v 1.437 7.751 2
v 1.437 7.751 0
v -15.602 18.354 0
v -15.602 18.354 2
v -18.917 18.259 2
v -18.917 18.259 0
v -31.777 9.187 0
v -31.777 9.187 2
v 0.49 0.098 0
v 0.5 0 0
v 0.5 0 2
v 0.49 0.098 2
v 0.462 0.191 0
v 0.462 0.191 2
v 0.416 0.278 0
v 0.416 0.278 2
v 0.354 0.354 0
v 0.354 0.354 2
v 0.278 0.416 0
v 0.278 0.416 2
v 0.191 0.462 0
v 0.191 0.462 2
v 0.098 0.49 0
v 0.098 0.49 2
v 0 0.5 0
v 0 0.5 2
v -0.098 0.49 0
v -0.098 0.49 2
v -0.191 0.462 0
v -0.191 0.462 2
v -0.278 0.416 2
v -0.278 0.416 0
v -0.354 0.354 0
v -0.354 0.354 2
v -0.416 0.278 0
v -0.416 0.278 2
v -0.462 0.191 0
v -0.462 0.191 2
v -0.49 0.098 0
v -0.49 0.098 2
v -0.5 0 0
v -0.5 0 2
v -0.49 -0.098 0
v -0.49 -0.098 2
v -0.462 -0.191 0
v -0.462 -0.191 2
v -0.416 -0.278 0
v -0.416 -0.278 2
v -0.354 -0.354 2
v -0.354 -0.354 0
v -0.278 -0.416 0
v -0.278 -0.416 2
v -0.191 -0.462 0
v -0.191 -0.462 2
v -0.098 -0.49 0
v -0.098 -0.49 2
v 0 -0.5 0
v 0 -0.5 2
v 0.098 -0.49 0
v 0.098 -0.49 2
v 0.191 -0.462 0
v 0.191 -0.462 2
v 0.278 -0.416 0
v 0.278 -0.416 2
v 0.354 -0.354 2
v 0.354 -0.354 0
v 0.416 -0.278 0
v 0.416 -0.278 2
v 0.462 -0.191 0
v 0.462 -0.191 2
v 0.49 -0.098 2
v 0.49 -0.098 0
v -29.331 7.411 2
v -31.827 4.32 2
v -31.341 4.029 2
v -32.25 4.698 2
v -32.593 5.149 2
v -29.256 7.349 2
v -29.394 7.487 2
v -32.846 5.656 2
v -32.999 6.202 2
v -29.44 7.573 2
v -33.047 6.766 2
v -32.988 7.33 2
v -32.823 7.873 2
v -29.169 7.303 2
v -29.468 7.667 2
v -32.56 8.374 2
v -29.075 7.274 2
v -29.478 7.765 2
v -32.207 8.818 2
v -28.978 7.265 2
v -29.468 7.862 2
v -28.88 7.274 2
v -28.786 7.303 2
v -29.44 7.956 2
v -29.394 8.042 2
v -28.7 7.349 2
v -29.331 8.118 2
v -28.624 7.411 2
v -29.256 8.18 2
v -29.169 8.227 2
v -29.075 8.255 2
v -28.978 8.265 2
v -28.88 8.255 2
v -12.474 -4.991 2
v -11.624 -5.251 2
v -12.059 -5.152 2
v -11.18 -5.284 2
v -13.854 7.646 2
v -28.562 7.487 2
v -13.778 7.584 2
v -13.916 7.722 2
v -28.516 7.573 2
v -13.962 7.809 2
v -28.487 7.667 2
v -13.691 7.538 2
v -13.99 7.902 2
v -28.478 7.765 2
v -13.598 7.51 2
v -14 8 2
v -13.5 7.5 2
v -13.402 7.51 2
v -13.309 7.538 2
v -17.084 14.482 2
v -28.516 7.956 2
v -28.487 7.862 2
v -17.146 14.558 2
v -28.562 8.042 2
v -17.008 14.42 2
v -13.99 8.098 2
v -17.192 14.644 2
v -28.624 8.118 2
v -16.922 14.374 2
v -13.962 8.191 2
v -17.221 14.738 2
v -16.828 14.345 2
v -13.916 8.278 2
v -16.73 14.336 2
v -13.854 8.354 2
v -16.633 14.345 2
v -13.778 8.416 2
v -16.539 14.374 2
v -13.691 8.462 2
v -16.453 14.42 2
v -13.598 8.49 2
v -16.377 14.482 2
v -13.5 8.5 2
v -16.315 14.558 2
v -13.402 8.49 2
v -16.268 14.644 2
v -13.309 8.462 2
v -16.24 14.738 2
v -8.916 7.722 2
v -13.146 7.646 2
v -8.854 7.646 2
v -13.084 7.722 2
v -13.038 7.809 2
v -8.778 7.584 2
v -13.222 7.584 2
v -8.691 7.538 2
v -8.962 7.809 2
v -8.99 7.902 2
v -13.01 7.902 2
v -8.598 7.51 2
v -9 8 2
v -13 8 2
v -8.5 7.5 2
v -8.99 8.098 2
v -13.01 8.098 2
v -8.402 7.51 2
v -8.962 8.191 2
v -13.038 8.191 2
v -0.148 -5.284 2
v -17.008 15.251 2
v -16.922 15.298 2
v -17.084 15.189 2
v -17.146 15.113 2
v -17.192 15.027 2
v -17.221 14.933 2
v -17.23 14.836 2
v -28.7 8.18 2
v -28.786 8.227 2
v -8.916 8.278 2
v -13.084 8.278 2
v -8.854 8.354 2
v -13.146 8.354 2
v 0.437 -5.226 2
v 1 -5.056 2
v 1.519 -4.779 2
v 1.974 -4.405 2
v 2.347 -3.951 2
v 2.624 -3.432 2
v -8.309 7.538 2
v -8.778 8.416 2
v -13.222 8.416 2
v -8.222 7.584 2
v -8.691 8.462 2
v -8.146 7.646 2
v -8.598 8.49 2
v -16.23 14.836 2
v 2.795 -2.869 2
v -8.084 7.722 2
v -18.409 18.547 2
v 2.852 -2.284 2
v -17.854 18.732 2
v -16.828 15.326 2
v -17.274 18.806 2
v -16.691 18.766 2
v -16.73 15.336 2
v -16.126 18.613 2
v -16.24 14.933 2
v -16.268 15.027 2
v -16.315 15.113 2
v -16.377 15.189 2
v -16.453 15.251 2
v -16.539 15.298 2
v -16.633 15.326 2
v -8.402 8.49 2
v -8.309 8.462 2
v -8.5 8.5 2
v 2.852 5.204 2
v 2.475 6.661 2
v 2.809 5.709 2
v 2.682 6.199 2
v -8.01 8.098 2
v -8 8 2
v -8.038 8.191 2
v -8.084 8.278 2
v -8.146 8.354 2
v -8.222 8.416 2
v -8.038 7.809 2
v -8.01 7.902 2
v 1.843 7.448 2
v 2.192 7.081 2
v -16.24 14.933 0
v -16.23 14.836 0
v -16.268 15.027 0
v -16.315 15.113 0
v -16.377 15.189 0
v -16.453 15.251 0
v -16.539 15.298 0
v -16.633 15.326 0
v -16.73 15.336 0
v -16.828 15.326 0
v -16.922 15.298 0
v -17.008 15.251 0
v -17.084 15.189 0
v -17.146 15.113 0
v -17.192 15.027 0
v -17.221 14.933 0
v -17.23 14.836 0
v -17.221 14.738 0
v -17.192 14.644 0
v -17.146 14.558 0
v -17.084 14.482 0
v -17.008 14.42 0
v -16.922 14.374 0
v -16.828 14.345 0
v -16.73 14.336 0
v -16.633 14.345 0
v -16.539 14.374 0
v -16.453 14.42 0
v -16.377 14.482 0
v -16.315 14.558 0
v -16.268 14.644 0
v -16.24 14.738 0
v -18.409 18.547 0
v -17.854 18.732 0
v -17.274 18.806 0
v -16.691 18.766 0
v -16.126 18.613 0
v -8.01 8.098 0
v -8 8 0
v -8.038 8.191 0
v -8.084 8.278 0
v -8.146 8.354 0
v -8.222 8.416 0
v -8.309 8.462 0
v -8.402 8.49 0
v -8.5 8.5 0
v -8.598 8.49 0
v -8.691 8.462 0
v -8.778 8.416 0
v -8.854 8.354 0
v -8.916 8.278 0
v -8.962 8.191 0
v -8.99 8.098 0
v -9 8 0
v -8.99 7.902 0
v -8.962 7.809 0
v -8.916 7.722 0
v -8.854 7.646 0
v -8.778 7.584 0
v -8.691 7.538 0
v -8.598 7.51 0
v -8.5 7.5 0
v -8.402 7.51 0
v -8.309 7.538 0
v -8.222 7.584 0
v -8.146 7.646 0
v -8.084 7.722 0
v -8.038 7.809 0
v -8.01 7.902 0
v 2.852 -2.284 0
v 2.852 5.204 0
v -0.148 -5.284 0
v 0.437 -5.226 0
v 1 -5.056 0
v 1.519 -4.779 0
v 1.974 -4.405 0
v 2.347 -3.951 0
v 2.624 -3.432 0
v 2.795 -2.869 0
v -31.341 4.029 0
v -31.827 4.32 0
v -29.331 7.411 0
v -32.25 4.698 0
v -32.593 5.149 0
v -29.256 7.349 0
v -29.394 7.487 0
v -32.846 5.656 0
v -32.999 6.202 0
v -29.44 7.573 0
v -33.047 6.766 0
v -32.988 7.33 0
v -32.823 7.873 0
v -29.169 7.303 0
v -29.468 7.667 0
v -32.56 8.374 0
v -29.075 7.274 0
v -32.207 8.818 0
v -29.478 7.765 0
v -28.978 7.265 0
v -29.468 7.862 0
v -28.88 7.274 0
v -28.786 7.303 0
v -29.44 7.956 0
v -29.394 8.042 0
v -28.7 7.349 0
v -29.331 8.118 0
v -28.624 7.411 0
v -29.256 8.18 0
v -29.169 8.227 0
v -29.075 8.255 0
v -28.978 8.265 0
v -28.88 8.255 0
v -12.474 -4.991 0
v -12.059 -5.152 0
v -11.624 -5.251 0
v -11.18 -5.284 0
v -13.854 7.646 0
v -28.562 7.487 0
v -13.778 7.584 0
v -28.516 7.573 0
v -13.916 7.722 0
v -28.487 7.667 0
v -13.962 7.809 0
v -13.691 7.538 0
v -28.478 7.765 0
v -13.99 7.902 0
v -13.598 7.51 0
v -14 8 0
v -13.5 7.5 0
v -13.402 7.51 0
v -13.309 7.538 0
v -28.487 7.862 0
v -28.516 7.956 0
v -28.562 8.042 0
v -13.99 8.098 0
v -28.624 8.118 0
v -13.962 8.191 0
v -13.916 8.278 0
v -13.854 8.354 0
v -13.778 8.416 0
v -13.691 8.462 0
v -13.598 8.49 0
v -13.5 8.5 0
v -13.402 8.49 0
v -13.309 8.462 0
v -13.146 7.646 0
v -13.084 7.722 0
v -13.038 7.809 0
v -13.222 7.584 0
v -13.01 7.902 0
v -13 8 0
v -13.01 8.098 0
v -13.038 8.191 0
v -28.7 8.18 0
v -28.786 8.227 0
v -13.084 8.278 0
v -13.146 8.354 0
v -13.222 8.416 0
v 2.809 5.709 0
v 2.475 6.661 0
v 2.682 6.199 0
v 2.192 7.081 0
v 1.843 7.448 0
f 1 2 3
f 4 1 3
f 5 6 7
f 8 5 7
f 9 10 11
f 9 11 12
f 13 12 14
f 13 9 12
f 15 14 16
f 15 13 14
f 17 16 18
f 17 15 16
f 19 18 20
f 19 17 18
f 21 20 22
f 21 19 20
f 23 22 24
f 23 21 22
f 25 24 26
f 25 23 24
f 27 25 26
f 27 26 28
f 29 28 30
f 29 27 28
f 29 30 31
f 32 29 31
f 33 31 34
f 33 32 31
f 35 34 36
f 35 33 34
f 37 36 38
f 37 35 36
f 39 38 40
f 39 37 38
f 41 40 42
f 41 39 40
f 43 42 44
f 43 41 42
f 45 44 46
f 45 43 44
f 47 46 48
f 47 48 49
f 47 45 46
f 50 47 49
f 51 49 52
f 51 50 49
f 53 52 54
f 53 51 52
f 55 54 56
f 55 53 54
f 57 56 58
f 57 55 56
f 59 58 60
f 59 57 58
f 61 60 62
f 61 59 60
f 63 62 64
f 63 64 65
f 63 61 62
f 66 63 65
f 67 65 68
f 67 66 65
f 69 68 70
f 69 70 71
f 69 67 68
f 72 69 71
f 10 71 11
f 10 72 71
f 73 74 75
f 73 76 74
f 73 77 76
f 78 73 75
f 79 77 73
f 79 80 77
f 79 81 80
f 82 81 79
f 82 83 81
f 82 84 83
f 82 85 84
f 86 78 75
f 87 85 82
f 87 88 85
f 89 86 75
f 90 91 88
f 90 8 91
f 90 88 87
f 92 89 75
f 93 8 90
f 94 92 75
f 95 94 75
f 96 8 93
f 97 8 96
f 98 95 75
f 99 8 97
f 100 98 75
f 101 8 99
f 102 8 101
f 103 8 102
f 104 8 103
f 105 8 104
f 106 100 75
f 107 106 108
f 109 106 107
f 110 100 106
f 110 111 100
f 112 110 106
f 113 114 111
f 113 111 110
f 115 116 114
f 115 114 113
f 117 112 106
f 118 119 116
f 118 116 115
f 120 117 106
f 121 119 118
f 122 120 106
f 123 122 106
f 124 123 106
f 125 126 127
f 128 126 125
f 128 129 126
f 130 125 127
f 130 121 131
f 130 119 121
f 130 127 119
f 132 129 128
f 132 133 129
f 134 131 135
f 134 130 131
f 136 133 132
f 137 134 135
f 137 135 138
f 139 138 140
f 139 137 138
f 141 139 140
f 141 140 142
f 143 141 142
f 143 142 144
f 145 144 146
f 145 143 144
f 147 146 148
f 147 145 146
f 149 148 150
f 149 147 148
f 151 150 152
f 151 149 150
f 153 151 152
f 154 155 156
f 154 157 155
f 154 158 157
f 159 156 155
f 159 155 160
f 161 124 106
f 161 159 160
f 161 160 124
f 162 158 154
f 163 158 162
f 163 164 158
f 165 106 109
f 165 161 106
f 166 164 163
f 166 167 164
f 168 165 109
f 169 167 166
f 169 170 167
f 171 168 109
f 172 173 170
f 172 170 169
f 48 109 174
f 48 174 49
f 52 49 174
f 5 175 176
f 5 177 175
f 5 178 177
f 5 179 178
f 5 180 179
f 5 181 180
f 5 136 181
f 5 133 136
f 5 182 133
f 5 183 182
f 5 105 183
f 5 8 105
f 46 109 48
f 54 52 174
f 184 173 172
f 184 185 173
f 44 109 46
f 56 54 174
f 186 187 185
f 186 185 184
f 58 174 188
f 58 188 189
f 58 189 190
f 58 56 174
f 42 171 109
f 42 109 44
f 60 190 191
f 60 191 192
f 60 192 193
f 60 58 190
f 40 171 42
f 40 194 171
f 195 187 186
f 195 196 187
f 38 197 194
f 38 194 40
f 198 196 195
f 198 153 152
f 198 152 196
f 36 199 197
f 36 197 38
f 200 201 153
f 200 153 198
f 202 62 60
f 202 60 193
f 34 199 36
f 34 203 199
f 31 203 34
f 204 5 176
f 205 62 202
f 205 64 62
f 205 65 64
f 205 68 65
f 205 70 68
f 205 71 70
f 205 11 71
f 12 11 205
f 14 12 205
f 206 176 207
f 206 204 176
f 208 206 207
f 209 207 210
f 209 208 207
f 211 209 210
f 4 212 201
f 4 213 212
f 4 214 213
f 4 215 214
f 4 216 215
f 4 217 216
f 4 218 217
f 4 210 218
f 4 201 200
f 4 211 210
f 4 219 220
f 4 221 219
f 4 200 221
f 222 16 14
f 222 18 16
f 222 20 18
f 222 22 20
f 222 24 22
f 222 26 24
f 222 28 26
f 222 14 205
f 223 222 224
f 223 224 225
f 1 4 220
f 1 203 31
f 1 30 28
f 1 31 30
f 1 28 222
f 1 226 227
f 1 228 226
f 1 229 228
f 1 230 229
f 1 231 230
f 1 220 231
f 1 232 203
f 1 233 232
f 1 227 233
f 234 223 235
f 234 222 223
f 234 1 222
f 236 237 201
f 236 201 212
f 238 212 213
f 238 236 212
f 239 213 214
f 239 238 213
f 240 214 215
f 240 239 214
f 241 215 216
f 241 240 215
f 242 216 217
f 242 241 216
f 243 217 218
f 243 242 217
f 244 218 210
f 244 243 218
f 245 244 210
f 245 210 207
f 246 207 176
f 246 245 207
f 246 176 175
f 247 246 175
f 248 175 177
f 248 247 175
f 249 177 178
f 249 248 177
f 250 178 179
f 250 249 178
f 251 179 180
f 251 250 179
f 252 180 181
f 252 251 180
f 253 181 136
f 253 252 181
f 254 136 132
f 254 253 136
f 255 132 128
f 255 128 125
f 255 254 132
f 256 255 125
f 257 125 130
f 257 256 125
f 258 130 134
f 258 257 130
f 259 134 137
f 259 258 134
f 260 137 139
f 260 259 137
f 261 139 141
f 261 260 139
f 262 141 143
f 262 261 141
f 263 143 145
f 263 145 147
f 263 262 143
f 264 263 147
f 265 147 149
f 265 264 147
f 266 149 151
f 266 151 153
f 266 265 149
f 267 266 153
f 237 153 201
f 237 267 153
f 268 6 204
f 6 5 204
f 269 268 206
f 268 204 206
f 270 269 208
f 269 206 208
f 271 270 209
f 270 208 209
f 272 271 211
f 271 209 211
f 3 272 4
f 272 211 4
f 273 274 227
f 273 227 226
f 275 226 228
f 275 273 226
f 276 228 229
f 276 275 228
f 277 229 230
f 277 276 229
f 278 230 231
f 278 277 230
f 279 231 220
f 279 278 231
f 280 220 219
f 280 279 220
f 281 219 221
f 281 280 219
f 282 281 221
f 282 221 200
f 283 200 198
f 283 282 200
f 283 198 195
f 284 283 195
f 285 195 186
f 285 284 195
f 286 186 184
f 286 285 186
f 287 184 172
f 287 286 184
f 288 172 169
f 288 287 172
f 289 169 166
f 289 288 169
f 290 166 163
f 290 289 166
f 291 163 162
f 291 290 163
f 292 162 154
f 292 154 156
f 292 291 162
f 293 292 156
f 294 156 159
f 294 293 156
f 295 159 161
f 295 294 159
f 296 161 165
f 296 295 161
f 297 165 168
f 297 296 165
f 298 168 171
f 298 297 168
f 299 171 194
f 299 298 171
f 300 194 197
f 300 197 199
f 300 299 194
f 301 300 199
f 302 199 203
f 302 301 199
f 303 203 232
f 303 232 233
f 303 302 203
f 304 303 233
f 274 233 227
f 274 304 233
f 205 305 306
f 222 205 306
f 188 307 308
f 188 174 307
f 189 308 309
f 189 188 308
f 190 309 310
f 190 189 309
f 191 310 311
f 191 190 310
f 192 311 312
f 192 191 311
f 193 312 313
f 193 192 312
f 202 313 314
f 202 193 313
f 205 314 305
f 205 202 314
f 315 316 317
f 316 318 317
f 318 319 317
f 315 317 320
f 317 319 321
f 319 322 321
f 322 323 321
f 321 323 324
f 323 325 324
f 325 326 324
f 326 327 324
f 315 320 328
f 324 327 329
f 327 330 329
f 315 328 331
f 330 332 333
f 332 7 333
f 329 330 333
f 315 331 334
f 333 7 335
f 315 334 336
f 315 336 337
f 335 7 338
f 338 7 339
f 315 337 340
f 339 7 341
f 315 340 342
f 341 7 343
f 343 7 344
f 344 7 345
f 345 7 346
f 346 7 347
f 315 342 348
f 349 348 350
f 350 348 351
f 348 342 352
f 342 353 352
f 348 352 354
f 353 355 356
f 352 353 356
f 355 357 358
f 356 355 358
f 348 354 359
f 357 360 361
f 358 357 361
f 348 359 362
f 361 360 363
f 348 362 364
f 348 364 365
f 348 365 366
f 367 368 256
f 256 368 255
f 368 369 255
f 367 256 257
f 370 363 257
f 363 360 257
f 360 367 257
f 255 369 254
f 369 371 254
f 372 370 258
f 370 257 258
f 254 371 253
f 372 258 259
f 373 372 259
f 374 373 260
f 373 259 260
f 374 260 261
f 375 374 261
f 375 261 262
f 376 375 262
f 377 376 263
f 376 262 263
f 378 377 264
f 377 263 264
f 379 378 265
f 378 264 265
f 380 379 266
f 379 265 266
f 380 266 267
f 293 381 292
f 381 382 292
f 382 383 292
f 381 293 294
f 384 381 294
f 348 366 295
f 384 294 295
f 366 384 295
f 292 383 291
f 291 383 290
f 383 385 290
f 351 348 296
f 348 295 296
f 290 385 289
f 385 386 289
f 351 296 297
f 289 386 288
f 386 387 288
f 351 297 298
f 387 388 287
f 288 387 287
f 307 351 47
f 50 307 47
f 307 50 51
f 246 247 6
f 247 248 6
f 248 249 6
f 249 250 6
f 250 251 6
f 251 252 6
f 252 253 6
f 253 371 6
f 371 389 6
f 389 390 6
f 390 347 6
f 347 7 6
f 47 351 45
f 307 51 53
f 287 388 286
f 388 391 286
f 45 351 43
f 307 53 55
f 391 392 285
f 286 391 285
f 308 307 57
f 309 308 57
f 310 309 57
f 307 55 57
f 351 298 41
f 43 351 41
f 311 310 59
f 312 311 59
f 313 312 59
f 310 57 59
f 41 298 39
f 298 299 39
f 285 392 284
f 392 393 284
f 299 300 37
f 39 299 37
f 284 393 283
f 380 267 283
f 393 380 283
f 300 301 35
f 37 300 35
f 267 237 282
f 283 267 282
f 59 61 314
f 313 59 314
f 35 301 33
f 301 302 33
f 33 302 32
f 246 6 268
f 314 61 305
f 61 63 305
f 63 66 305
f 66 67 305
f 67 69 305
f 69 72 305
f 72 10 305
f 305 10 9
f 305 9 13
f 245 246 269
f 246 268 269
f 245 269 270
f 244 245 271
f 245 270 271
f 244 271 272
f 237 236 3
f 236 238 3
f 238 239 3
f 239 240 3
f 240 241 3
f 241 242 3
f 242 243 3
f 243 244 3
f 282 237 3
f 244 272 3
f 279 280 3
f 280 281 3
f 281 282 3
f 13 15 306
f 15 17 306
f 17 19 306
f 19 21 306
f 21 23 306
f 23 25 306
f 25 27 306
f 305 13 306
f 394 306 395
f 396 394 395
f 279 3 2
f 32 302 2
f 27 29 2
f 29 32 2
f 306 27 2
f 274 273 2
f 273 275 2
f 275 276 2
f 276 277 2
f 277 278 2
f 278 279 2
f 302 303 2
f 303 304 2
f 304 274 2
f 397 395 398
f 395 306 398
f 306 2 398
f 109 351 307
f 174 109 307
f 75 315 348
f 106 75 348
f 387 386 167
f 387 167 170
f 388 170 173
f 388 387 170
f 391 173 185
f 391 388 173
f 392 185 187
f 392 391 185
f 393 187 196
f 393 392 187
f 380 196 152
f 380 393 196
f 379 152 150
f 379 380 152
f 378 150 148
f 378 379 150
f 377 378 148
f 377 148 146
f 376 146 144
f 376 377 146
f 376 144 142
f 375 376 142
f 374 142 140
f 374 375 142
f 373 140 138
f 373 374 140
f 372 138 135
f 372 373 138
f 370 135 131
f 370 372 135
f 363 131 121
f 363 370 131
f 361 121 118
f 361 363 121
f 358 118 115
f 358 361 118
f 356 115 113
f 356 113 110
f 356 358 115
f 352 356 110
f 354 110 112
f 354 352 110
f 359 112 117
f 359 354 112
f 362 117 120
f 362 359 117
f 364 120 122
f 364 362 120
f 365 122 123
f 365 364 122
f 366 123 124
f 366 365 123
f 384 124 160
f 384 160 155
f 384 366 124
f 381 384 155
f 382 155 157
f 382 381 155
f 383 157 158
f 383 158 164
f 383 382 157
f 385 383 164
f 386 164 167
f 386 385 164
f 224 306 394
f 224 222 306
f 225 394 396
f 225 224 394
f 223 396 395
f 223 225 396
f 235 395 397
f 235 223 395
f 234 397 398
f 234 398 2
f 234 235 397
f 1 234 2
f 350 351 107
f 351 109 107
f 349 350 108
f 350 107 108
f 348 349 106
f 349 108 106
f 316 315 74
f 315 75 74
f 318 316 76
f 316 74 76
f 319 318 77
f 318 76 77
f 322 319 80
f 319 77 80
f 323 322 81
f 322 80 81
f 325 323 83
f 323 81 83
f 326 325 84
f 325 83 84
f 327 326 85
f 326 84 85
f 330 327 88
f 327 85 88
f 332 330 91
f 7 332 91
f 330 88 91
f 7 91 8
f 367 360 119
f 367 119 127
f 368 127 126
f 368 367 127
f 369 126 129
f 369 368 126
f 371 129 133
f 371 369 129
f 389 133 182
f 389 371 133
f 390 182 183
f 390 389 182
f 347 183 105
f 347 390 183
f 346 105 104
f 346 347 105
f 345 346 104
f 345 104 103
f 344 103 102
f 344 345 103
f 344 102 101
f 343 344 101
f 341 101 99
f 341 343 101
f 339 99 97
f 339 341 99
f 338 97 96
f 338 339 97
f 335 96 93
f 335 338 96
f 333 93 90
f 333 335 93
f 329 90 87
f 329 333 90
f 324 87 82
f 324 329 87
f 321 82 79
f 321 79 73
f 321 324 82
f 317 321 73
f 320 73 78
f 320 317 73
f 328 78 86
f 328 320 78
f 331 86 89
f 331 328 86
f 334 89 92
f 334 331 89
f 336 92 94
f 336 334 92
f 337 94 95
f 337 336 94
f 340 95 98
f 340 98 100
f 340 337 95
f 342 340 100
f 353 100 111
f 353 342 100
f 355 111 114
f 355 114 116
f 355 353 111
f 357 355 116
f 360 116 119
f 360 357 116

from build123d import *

# Parameters (mm, degrees)
F0_R     = 0.5
F1_DEPTH = 2
F2_R     = 3


with BuildPart() as f1:
    # F0 (on Top) → F1 (new body)
    with BuildSketch(Plane.XY):
        Polygon((-11.8603997611, -5.284095183), (2.8522056527, -5.284095183), (2.8522056527, 6.8704825826), (-17.2913148999, 19.4052960724), (-35.9591057258, 6.2361949424), align=None)
        Circle(F0_R, mode=Mode.SUBTRACT)
        with Locations((-28.9777747887, 7.7645713531)):
            Circle(F0_R, mode=Mode.SUBTRACT)
        with Locations((-16.7303260748, 14.8356391649)):
            Circle(F0_R, mode=Mode.SUBTRACT)
        with Locations((-13.5, 8)):
            Circle(F0_R, mode=Mode.SUBTRACT)
        with Locations((-8.5, 8)):
            Circle(F0_R, mode=Mode.SUBTRACT)
    extrude(amount=F1_DEPTH)

    # F2
    f2_edges = [f1.edges().sort_by_distance(p)[0] for p in [
        (-17.291315, 19.405296, 1),
        (2.852206, -5.284095, 1),
        (2.852206, 6.870483, 1),
        (-35.959106, 6.236195, 1),
        (-11.8604, -5.284095, 1),
    ]]
    fillet(f2_edges, radius=F2_R)


solid = f1.part
